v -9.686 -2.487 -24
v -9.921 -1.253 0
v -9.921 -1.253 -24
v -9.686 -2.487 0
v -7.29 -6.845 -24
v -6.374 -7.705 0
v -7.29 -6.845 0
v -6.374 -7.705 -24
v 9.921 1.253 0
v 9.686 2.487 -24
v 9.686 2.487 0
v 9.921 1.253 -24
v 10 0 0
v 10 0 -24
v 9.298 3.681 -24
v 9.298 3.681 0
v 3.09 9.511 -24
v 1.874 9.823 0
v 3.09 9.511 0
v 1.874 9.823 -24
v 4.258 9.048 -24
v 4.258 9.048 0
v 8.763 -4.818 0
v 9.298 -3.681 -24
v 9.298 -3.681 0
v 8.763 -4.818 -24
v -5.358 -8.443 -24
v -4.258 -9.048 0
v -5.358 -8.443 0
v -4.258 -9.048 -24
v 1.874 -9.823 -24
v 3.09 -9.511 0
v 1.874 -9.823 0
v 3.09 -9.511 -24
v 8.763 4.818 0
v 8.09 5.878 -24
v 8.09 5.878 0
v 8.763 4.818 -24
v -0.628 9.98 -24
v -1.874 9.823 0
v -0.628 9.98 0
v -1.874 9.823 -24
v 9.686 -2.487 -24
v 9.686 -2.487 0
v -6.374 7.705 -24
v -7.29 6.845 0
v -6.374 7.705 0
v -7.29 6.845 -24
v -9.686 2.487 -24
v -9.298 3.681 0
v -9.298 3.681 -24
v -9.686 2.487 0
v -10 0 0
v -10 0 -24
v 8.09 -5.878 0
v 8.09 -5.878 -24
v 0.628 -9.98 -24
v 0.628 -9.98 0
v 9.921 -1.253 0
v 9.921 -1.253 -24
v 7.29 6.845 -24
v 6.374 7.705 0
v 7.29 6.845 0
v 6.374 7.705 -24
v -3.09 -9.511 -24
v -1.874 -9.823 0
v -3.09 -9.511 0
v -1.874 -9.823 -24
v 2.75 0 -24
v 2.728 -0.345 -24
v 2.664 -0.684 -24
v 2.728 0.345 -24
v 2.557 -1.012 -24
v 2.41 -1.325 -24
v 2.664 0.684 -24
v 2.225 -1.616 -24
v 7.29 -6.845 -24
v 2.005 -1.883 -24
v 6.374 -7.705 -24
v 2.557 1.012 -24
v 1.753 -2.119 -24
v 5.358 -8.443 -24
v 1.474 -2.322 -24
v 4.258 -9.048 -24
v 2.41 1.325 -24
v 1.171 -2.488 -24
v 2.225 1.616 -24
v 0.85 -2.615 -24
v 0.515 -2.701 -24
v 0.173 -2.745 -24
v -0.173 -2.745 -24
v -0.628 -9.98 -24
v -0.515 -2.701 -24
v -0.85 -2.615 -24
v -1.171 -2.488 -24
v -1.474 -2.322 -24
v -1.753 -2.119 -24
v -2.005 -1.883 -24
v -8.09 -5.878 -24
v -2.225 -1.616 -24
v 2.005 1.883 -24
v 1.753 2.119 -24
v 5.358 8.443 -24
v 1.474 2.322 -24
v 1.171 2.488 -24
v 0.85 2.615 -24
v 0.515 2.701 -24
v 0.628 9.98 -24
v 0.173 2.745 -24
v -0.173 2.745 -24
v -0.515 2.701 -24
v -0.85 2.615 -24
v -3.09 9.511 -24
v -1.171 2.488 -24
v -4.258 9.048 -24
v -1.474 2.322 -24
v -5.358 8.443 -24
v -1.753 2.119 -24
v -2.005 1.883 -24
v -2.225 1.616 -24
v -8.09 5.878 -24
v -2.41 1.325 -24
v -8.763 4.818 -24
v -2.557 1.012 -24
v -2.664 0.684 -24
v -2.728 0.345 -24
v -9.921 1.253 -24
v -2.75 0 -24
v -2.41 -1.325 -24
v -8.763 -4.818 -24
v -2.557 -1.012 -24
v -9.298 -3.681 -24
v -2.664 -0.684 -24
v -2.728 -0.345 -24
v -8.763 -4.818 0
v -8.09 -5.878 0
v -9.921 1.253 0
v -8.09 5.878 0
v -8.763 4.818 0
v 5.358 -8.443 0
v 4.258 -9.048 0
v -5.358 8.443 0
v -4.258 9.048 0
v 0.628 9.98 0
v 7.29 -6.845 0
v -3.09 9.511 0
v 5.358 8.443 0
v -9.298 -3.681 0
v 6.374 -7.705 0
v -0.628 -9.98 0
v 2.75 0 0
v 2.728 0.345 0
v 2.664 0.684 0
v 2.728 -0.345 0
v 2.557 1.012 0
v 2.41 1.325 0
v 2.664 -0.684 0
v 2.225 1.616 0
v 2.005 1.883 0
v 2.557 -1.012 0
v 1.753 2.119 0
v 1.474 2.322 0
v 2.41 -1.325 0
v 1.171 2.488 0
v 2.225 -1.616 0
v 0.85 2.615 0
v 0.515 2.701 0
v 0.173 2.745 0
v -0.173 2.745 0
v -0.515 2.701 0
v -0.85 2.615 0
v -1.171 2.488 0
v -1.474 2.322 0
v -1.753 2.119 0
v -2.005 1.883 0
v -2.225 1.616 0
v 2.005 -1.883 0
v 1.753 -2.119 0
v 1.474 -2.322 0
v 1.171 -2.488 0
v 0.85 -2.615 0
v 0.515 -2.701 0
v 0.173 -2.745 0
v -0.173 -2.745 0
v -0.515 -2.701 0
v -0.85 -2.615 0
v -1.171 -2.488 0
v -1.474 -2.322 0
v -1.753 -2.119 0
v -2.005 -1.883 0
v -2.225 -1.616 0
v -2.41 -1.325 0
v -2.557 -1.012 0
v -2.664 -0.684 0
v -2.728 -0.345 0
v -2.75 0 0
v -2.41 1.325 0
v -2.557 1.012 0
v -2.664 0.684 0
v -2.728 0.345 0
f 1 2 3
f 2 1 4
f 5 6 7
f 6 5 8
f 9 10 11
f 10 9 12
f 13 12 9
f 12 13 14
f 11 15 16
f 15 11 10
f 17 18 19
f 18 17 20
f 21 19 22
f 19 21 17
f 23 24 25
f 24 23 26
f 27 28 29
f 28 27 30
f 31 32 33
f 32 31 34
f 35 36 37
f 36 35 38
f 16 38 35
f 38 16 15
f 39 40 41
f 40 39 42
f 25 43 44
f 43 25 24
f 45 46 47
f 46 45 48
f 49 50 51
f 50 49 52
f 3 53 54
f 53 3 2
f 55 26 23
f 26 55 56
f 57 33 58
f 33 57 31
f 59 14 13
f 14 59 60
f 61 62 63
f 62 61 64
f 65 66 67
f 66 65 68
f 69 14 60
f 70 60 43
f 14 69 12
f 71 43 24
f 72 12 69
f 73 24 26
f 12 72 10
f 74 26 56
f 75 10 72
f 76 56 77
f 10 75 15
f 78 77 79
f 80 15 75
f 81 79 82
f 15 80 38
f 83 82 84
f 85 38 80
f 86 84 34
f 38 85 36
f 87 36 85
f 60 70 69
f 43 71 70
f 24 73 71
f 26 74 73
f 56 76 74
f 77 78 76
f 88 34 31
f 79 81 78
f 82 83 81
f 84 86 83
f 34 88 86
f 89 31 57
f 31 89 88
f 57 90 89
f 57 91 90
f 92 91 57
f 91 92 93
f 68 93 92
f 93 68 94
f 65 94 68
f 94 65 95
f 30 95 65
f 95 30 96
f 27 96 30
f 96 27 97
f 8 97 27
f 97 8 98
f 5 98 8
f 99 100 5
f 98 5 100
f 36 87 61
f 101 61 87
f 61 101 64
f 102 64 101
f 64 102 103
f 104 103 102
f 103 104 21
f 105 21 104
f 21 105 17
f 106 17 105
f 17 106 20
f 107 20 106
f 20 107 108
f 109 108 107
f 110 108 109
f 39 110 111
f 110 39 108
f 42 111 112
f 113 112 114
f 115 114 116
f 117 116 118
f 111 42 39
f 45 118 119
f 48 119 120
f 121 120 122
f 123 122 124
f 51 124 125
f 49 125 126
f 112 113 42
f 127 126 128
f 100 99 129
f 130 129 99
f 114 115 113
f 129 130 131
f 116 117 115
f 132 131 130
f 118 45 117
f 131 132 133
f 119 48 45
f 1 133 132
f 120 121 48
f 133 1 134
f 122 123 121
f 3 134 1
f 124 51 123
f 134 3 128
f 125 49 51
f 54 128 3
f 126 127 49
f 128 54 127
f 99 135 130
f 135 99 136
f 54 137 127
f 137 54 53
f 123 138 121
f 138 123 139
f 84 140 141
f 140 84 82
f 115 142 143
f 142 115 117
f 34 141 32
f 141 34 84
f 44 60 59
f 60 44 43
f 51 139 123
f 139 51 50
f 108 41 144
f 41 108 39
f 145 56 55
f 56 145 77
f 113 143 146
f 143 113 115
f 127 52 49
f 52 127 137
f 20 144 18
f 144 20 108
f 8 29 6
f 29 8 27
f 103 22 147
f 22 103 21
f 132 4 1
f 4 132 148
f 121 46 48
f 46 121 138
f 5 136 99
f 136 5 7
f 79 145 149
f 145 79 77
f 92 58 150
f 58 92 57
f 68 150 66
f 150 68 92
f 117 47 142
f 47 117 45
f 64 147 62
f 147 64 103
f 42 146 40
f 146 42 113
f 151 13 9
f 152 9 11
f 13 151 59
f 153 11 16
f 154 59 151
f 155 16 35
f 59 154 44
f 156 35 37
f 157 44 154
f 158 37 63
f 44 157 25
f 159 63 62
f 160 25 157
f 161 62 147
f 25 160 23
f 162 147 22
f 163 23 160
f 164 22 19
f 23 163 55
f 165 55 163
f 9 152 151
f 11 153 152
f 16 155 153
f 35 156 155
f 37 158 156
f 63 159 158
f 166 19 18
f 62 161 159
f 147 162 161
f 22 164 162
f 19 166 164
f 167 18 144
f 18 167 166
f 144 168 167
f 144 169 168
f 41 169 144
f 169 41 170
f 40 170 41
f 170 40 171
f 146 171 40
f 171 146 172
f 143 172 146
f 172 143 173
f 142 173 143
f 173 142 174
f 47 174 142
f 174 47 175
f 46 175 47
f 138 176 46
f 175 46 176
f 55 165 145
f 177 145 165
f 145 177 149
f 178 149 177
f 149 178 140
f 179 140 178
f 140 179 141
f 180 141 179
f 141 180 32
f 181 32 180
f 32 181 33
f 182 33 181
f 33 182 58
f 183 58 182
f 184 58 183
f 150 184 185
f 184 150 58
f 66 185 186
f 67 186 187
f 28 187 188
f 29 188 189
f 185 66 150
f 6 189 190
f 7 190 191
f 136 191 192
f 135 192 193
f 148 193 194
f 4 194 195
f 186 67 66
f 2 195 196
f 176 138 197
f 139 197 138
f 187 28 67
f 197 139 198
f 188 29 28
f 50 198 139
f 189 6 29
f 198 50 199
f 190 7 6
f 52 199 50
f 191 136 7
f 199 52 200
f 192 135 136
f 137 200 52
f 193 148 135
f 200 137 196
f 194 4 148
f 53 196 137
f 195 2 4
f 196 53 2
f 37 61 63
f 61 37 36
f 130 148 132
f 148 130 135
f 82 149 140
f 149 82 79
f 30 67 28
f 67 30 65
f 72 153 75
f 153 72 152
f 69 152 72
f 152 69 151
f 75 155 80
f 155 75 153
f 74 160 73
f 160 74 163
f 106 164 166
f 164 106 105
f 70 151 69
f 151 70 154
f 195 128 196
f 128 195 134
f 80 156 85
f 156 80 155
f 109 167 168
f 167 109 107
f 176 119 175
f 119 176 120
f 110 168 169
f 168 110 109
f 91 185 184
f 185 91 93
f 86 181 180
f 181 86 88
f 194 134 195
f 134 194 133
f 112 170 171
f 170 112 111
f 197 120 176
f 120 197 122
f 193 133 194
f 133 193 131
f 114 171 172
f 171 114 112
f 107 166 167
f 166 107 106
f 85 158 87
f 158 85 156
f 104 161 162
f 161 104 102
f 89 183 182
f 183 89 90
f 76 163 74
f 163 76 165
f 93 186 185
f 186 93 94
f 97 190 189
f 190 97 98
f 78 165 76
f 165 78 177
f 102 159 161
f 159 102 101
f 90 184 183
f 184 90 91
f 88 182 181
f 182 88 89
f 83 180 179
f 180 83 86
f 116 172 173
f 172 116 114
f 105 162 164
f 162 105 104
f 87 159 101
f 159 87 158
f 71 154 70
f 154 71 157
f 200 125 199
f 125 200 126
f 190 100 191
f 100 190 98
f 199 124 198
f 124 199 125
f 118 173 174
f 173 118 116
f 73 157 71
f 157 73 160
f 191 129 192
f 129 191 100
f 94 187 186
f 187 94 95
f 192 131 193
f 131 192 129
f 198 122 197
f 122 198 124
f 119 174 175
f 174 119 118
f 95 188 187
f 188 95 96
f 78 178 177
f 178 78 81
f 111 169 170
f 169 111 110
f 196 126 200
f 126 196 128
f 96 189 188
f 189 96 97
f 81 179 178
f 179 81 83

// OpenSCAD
$fn = 50;


difference() {
	union() {
		translate(v = [0, 0, -24.0000000000]) {
			cylinder(h = 24, r = 10.0000000000);
		}
		cylinder(h = 0, r = 16.0000000000);
	}
	union() {
		#translate(v = [0, 0, -24]) {
			cylinder(h = 24, r = 2.7500000000);
		}
	}
}
